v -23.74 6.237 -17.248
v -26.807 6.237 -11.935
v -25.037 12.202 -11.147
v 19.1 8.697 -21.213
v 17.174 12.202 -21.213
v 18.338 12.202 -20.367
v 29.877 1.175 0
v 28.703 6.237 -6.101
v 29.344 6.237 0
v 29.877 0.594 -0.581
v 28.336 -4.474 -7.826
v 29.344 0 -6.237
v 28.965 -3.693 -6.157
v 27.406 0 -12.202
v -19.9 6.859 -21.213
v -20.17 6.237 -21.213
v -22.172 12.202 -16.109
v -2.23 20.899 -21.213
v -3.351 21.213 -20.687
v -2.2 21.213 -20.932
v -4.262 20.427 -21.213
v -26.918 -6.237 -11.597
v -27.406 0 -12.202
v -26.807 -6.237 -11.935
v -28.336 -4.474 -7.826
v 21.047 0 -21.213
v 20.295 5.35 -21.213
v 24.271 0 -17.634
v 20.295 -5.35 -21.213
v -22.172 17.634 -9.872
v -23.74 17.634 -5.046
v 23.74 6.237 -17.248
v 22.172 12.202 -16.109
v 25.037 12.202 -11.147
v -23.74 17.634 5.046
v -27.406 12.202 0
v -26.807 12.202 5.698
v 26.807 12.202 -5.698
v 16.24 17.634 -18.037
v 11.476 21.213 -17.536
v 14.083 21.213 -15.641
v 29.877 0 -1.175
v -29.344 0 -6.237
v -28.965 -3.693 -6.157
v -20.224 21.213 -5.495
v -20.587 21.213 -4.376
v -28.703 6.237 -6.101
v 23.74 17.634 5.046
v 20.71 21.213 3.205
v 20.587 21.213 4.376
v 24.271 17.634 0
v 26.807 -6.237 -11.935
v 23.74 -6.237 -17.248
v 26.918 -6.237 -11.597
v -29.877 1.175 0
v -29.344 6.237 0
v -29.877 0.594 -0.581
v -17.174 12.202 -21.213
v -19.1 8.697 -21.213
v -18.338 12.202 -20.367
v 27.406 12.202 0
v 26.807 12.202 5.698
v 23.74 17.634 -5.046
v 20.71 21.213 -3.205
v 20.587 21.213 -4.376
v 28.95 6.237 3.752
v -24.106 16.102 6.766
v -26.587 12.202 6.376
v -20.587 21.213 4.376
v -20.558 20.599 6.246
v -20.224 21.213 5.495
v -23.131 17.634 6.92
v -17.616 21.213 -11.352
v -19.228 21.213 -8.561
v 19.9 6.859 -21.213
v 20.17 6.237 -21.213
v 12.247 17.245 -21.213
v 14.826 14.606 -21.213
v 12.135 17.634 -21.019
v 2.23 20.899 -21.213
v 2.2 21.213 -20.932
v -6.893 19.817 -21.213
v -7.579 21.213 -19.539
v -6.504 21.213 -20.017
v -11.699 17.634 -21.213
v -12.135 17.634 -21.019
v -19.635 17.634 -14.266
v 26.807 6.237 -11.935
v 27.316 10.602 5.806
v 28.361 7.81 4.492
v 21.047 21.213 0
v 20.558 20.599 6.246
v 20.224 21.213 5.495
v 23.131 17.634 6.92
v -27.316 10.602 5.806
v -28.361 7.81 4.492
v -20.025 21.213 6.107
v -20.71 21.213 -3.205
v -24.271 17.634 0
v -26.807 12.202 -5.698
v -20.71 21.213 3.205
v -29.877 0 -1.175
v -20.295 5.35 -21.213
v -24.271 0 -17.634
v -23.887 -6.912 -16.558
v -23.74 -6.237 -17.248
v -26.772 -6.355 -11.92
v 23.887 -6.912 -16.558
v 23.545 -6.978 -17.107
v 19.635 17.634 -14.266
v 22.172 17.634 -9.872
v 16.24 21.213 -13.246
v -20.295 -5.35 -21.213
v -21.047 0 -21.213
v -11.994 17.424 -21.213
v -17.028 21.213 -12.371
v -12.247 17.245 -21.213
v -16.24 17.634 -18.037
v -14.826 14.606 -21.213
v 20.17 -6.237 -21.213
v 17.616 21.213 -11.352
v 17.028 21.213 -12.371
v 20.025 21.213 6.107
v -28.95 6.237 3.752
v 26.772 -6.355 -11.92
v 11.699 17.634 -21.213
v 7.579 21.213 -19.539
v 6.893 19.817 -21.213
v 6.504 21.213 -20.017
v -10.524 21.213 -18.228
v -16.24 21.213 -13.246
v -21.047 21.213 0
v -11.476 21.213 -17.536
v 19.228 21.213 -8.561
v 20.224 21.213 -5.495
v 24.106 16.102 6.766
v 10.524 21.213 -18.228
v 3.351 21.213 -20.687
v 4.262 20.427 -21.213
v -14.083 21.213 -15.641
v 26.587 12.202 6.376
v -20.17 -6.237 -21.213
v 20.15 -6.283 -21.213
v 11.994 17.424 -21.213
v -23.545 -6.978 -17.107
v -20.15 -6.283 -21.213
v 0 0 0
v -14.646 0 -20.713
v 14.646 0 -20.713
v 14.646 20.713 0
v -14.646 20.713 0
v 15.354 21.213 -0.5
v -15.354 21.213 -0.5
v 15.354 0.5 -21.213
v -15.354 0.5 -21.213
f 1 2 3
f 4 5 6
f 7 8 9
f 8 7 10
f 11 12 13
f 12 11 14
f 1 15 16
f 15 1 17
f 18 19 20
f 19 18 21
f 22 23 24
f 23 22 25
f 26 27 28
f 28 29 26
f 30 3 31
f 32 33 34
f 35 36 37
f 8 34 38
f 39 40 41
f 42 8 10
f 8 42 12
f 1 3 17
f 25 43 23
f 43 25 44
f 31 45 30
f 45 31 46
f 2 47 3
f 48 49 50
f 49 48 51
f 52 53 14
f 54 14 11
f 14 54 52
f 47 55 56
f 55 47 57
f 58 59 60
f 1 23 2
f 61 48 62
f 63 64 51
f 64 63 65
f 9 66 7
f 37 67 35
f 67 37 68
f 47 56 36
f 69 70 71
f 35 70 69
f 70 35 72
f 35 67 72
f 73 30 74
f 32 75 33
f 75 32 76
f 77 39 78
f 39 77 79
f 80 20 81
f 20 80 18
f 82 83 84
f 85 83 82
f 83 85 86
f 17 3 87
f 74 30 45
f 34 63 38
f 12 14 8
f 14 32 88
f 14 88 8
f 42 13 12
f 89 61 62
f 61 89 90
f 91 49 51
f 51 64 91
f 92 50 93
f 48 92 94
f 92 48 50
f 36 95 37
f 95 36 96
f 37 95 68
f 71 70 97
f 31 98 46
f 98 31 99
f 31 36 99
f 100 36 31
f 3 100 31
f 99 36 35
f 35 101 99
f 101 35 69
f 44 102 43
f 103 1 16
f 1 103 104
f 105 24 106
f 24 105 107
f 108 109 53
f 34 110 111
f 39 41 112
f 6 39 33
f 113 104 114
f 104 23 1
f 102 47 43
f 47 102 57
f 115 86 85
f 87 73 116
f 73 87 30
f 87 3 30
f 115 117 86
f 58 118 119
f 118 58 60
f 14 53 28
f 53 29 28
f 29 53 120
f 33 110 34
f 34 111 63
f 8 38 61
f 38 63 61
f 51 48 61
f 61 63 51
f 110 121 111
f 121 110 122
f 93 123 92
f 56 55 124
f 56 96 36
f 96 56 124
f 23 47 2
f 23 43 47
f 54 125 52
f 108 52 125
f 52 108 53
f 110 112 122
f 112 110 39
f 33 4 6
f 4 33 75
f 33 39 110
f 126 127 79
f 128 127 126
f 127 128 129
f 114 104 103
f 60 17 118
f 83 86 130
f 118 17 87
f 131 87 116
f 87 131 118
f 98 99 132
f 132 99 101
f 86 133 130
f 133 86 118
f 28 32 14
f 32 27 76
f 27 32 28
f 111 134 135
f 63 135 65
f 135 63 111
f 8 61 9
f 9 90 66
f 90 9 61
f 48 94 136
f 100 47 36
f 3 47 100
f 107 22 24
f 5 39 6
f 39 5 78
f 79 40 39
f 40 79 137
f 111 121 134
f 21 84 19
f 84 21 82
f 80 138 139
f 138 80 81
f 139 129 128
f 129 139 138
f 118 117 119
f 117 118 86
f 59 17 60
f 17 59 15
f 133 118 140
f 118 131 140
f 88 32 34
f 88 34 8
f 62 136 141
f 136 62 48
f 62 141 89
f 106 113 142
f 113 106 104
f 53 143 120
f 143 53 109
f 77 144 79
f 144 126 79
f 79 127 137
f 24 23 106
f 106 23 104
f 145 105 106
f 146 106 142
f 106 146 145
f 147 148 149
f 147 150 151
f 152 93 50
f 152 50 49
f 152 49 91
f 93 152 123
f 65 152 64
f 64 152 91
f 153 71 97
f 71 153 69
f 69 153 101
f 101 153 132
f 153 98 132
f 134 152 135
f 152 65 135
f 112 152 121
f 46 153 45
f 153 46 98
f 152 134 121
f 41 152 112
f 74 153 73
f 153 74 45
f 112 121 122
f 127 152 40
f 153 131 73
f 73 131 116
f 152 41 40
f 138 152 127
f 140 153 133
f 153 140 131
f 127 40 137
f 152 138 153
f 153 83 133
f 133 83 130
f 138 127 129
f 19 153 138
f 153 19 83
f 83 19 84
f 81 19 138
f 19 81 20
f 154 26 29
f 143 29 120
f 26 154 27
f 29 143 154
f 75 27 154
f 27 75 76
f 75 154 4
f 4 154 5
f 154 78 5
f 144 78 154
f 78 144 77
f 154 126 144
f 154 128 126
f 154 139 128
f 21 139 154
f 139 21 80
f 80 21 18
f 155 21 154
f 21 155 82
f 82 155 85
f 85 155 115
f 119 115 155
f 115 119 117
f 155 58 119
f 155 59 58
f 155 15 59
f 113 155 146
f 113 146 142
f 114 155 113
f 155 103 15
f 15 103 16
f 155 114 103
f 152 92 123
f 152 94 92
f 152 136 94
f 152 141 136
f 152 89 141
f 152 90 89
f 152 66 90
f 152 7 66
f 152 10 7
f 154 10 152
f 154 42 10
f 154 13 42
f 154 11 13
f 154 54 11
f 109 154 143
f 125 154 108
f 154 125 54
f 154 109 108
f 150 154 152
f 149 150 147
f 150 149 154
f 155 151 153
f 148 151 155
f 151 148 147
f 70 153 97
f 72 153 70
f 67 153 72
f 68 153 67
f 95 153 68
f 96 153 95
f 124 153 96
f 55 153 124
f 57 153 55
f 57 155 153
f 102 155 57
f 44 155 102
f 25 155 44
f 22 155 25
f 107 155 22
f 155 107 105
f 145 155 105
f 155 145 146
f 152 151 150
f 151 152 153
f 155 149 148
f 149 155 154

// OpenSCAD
// sphere puzzle

R=30; // radius of sphere
tol=0.5;// tolerance to allow looser fit
x=R*cos(45);

rotate([-90,0,])
difference(){
	sphere(r=R);
	translate([0,0,-R])
		cube(size=[R,2*R,2*R],center=true);
	translate([0,-R,0])
		cube(size=[R,2*R,2*R],center=true);
	rotate([-45,0,0])
		translate([0,0,-2*R])
			cube(size=4*R,center=true);
	translate([0,0,R+x])
		cube(size=2*R,center=true);
	translate([0,R+x,0])
		cube(size=2*R,center=true);
	translate([R/2,0,0])
		rotate([-45,0,0])rotate([0,45,0])
			cube(size=[x,2*R,x+2*tol],center=true);
	translate([-R/2,0,0])
		rotate([-45,0,0])rotate([0,45,0])
			cube(size=[x+2*tol,2*R,x],center=true);
	translate([0,-x+tol,0])
		rotate([45,0,0])translate([0,0,R/2])
			cube(size=[R+2*tol*cos(45),2*R,R],center=true);
	translate([0,0,-x+tol])
		rotate([45,0,0])translate([0,0,-R/2])
			cube(size=[R+2*tol*cos(45),2*R,R],center=true);
}
